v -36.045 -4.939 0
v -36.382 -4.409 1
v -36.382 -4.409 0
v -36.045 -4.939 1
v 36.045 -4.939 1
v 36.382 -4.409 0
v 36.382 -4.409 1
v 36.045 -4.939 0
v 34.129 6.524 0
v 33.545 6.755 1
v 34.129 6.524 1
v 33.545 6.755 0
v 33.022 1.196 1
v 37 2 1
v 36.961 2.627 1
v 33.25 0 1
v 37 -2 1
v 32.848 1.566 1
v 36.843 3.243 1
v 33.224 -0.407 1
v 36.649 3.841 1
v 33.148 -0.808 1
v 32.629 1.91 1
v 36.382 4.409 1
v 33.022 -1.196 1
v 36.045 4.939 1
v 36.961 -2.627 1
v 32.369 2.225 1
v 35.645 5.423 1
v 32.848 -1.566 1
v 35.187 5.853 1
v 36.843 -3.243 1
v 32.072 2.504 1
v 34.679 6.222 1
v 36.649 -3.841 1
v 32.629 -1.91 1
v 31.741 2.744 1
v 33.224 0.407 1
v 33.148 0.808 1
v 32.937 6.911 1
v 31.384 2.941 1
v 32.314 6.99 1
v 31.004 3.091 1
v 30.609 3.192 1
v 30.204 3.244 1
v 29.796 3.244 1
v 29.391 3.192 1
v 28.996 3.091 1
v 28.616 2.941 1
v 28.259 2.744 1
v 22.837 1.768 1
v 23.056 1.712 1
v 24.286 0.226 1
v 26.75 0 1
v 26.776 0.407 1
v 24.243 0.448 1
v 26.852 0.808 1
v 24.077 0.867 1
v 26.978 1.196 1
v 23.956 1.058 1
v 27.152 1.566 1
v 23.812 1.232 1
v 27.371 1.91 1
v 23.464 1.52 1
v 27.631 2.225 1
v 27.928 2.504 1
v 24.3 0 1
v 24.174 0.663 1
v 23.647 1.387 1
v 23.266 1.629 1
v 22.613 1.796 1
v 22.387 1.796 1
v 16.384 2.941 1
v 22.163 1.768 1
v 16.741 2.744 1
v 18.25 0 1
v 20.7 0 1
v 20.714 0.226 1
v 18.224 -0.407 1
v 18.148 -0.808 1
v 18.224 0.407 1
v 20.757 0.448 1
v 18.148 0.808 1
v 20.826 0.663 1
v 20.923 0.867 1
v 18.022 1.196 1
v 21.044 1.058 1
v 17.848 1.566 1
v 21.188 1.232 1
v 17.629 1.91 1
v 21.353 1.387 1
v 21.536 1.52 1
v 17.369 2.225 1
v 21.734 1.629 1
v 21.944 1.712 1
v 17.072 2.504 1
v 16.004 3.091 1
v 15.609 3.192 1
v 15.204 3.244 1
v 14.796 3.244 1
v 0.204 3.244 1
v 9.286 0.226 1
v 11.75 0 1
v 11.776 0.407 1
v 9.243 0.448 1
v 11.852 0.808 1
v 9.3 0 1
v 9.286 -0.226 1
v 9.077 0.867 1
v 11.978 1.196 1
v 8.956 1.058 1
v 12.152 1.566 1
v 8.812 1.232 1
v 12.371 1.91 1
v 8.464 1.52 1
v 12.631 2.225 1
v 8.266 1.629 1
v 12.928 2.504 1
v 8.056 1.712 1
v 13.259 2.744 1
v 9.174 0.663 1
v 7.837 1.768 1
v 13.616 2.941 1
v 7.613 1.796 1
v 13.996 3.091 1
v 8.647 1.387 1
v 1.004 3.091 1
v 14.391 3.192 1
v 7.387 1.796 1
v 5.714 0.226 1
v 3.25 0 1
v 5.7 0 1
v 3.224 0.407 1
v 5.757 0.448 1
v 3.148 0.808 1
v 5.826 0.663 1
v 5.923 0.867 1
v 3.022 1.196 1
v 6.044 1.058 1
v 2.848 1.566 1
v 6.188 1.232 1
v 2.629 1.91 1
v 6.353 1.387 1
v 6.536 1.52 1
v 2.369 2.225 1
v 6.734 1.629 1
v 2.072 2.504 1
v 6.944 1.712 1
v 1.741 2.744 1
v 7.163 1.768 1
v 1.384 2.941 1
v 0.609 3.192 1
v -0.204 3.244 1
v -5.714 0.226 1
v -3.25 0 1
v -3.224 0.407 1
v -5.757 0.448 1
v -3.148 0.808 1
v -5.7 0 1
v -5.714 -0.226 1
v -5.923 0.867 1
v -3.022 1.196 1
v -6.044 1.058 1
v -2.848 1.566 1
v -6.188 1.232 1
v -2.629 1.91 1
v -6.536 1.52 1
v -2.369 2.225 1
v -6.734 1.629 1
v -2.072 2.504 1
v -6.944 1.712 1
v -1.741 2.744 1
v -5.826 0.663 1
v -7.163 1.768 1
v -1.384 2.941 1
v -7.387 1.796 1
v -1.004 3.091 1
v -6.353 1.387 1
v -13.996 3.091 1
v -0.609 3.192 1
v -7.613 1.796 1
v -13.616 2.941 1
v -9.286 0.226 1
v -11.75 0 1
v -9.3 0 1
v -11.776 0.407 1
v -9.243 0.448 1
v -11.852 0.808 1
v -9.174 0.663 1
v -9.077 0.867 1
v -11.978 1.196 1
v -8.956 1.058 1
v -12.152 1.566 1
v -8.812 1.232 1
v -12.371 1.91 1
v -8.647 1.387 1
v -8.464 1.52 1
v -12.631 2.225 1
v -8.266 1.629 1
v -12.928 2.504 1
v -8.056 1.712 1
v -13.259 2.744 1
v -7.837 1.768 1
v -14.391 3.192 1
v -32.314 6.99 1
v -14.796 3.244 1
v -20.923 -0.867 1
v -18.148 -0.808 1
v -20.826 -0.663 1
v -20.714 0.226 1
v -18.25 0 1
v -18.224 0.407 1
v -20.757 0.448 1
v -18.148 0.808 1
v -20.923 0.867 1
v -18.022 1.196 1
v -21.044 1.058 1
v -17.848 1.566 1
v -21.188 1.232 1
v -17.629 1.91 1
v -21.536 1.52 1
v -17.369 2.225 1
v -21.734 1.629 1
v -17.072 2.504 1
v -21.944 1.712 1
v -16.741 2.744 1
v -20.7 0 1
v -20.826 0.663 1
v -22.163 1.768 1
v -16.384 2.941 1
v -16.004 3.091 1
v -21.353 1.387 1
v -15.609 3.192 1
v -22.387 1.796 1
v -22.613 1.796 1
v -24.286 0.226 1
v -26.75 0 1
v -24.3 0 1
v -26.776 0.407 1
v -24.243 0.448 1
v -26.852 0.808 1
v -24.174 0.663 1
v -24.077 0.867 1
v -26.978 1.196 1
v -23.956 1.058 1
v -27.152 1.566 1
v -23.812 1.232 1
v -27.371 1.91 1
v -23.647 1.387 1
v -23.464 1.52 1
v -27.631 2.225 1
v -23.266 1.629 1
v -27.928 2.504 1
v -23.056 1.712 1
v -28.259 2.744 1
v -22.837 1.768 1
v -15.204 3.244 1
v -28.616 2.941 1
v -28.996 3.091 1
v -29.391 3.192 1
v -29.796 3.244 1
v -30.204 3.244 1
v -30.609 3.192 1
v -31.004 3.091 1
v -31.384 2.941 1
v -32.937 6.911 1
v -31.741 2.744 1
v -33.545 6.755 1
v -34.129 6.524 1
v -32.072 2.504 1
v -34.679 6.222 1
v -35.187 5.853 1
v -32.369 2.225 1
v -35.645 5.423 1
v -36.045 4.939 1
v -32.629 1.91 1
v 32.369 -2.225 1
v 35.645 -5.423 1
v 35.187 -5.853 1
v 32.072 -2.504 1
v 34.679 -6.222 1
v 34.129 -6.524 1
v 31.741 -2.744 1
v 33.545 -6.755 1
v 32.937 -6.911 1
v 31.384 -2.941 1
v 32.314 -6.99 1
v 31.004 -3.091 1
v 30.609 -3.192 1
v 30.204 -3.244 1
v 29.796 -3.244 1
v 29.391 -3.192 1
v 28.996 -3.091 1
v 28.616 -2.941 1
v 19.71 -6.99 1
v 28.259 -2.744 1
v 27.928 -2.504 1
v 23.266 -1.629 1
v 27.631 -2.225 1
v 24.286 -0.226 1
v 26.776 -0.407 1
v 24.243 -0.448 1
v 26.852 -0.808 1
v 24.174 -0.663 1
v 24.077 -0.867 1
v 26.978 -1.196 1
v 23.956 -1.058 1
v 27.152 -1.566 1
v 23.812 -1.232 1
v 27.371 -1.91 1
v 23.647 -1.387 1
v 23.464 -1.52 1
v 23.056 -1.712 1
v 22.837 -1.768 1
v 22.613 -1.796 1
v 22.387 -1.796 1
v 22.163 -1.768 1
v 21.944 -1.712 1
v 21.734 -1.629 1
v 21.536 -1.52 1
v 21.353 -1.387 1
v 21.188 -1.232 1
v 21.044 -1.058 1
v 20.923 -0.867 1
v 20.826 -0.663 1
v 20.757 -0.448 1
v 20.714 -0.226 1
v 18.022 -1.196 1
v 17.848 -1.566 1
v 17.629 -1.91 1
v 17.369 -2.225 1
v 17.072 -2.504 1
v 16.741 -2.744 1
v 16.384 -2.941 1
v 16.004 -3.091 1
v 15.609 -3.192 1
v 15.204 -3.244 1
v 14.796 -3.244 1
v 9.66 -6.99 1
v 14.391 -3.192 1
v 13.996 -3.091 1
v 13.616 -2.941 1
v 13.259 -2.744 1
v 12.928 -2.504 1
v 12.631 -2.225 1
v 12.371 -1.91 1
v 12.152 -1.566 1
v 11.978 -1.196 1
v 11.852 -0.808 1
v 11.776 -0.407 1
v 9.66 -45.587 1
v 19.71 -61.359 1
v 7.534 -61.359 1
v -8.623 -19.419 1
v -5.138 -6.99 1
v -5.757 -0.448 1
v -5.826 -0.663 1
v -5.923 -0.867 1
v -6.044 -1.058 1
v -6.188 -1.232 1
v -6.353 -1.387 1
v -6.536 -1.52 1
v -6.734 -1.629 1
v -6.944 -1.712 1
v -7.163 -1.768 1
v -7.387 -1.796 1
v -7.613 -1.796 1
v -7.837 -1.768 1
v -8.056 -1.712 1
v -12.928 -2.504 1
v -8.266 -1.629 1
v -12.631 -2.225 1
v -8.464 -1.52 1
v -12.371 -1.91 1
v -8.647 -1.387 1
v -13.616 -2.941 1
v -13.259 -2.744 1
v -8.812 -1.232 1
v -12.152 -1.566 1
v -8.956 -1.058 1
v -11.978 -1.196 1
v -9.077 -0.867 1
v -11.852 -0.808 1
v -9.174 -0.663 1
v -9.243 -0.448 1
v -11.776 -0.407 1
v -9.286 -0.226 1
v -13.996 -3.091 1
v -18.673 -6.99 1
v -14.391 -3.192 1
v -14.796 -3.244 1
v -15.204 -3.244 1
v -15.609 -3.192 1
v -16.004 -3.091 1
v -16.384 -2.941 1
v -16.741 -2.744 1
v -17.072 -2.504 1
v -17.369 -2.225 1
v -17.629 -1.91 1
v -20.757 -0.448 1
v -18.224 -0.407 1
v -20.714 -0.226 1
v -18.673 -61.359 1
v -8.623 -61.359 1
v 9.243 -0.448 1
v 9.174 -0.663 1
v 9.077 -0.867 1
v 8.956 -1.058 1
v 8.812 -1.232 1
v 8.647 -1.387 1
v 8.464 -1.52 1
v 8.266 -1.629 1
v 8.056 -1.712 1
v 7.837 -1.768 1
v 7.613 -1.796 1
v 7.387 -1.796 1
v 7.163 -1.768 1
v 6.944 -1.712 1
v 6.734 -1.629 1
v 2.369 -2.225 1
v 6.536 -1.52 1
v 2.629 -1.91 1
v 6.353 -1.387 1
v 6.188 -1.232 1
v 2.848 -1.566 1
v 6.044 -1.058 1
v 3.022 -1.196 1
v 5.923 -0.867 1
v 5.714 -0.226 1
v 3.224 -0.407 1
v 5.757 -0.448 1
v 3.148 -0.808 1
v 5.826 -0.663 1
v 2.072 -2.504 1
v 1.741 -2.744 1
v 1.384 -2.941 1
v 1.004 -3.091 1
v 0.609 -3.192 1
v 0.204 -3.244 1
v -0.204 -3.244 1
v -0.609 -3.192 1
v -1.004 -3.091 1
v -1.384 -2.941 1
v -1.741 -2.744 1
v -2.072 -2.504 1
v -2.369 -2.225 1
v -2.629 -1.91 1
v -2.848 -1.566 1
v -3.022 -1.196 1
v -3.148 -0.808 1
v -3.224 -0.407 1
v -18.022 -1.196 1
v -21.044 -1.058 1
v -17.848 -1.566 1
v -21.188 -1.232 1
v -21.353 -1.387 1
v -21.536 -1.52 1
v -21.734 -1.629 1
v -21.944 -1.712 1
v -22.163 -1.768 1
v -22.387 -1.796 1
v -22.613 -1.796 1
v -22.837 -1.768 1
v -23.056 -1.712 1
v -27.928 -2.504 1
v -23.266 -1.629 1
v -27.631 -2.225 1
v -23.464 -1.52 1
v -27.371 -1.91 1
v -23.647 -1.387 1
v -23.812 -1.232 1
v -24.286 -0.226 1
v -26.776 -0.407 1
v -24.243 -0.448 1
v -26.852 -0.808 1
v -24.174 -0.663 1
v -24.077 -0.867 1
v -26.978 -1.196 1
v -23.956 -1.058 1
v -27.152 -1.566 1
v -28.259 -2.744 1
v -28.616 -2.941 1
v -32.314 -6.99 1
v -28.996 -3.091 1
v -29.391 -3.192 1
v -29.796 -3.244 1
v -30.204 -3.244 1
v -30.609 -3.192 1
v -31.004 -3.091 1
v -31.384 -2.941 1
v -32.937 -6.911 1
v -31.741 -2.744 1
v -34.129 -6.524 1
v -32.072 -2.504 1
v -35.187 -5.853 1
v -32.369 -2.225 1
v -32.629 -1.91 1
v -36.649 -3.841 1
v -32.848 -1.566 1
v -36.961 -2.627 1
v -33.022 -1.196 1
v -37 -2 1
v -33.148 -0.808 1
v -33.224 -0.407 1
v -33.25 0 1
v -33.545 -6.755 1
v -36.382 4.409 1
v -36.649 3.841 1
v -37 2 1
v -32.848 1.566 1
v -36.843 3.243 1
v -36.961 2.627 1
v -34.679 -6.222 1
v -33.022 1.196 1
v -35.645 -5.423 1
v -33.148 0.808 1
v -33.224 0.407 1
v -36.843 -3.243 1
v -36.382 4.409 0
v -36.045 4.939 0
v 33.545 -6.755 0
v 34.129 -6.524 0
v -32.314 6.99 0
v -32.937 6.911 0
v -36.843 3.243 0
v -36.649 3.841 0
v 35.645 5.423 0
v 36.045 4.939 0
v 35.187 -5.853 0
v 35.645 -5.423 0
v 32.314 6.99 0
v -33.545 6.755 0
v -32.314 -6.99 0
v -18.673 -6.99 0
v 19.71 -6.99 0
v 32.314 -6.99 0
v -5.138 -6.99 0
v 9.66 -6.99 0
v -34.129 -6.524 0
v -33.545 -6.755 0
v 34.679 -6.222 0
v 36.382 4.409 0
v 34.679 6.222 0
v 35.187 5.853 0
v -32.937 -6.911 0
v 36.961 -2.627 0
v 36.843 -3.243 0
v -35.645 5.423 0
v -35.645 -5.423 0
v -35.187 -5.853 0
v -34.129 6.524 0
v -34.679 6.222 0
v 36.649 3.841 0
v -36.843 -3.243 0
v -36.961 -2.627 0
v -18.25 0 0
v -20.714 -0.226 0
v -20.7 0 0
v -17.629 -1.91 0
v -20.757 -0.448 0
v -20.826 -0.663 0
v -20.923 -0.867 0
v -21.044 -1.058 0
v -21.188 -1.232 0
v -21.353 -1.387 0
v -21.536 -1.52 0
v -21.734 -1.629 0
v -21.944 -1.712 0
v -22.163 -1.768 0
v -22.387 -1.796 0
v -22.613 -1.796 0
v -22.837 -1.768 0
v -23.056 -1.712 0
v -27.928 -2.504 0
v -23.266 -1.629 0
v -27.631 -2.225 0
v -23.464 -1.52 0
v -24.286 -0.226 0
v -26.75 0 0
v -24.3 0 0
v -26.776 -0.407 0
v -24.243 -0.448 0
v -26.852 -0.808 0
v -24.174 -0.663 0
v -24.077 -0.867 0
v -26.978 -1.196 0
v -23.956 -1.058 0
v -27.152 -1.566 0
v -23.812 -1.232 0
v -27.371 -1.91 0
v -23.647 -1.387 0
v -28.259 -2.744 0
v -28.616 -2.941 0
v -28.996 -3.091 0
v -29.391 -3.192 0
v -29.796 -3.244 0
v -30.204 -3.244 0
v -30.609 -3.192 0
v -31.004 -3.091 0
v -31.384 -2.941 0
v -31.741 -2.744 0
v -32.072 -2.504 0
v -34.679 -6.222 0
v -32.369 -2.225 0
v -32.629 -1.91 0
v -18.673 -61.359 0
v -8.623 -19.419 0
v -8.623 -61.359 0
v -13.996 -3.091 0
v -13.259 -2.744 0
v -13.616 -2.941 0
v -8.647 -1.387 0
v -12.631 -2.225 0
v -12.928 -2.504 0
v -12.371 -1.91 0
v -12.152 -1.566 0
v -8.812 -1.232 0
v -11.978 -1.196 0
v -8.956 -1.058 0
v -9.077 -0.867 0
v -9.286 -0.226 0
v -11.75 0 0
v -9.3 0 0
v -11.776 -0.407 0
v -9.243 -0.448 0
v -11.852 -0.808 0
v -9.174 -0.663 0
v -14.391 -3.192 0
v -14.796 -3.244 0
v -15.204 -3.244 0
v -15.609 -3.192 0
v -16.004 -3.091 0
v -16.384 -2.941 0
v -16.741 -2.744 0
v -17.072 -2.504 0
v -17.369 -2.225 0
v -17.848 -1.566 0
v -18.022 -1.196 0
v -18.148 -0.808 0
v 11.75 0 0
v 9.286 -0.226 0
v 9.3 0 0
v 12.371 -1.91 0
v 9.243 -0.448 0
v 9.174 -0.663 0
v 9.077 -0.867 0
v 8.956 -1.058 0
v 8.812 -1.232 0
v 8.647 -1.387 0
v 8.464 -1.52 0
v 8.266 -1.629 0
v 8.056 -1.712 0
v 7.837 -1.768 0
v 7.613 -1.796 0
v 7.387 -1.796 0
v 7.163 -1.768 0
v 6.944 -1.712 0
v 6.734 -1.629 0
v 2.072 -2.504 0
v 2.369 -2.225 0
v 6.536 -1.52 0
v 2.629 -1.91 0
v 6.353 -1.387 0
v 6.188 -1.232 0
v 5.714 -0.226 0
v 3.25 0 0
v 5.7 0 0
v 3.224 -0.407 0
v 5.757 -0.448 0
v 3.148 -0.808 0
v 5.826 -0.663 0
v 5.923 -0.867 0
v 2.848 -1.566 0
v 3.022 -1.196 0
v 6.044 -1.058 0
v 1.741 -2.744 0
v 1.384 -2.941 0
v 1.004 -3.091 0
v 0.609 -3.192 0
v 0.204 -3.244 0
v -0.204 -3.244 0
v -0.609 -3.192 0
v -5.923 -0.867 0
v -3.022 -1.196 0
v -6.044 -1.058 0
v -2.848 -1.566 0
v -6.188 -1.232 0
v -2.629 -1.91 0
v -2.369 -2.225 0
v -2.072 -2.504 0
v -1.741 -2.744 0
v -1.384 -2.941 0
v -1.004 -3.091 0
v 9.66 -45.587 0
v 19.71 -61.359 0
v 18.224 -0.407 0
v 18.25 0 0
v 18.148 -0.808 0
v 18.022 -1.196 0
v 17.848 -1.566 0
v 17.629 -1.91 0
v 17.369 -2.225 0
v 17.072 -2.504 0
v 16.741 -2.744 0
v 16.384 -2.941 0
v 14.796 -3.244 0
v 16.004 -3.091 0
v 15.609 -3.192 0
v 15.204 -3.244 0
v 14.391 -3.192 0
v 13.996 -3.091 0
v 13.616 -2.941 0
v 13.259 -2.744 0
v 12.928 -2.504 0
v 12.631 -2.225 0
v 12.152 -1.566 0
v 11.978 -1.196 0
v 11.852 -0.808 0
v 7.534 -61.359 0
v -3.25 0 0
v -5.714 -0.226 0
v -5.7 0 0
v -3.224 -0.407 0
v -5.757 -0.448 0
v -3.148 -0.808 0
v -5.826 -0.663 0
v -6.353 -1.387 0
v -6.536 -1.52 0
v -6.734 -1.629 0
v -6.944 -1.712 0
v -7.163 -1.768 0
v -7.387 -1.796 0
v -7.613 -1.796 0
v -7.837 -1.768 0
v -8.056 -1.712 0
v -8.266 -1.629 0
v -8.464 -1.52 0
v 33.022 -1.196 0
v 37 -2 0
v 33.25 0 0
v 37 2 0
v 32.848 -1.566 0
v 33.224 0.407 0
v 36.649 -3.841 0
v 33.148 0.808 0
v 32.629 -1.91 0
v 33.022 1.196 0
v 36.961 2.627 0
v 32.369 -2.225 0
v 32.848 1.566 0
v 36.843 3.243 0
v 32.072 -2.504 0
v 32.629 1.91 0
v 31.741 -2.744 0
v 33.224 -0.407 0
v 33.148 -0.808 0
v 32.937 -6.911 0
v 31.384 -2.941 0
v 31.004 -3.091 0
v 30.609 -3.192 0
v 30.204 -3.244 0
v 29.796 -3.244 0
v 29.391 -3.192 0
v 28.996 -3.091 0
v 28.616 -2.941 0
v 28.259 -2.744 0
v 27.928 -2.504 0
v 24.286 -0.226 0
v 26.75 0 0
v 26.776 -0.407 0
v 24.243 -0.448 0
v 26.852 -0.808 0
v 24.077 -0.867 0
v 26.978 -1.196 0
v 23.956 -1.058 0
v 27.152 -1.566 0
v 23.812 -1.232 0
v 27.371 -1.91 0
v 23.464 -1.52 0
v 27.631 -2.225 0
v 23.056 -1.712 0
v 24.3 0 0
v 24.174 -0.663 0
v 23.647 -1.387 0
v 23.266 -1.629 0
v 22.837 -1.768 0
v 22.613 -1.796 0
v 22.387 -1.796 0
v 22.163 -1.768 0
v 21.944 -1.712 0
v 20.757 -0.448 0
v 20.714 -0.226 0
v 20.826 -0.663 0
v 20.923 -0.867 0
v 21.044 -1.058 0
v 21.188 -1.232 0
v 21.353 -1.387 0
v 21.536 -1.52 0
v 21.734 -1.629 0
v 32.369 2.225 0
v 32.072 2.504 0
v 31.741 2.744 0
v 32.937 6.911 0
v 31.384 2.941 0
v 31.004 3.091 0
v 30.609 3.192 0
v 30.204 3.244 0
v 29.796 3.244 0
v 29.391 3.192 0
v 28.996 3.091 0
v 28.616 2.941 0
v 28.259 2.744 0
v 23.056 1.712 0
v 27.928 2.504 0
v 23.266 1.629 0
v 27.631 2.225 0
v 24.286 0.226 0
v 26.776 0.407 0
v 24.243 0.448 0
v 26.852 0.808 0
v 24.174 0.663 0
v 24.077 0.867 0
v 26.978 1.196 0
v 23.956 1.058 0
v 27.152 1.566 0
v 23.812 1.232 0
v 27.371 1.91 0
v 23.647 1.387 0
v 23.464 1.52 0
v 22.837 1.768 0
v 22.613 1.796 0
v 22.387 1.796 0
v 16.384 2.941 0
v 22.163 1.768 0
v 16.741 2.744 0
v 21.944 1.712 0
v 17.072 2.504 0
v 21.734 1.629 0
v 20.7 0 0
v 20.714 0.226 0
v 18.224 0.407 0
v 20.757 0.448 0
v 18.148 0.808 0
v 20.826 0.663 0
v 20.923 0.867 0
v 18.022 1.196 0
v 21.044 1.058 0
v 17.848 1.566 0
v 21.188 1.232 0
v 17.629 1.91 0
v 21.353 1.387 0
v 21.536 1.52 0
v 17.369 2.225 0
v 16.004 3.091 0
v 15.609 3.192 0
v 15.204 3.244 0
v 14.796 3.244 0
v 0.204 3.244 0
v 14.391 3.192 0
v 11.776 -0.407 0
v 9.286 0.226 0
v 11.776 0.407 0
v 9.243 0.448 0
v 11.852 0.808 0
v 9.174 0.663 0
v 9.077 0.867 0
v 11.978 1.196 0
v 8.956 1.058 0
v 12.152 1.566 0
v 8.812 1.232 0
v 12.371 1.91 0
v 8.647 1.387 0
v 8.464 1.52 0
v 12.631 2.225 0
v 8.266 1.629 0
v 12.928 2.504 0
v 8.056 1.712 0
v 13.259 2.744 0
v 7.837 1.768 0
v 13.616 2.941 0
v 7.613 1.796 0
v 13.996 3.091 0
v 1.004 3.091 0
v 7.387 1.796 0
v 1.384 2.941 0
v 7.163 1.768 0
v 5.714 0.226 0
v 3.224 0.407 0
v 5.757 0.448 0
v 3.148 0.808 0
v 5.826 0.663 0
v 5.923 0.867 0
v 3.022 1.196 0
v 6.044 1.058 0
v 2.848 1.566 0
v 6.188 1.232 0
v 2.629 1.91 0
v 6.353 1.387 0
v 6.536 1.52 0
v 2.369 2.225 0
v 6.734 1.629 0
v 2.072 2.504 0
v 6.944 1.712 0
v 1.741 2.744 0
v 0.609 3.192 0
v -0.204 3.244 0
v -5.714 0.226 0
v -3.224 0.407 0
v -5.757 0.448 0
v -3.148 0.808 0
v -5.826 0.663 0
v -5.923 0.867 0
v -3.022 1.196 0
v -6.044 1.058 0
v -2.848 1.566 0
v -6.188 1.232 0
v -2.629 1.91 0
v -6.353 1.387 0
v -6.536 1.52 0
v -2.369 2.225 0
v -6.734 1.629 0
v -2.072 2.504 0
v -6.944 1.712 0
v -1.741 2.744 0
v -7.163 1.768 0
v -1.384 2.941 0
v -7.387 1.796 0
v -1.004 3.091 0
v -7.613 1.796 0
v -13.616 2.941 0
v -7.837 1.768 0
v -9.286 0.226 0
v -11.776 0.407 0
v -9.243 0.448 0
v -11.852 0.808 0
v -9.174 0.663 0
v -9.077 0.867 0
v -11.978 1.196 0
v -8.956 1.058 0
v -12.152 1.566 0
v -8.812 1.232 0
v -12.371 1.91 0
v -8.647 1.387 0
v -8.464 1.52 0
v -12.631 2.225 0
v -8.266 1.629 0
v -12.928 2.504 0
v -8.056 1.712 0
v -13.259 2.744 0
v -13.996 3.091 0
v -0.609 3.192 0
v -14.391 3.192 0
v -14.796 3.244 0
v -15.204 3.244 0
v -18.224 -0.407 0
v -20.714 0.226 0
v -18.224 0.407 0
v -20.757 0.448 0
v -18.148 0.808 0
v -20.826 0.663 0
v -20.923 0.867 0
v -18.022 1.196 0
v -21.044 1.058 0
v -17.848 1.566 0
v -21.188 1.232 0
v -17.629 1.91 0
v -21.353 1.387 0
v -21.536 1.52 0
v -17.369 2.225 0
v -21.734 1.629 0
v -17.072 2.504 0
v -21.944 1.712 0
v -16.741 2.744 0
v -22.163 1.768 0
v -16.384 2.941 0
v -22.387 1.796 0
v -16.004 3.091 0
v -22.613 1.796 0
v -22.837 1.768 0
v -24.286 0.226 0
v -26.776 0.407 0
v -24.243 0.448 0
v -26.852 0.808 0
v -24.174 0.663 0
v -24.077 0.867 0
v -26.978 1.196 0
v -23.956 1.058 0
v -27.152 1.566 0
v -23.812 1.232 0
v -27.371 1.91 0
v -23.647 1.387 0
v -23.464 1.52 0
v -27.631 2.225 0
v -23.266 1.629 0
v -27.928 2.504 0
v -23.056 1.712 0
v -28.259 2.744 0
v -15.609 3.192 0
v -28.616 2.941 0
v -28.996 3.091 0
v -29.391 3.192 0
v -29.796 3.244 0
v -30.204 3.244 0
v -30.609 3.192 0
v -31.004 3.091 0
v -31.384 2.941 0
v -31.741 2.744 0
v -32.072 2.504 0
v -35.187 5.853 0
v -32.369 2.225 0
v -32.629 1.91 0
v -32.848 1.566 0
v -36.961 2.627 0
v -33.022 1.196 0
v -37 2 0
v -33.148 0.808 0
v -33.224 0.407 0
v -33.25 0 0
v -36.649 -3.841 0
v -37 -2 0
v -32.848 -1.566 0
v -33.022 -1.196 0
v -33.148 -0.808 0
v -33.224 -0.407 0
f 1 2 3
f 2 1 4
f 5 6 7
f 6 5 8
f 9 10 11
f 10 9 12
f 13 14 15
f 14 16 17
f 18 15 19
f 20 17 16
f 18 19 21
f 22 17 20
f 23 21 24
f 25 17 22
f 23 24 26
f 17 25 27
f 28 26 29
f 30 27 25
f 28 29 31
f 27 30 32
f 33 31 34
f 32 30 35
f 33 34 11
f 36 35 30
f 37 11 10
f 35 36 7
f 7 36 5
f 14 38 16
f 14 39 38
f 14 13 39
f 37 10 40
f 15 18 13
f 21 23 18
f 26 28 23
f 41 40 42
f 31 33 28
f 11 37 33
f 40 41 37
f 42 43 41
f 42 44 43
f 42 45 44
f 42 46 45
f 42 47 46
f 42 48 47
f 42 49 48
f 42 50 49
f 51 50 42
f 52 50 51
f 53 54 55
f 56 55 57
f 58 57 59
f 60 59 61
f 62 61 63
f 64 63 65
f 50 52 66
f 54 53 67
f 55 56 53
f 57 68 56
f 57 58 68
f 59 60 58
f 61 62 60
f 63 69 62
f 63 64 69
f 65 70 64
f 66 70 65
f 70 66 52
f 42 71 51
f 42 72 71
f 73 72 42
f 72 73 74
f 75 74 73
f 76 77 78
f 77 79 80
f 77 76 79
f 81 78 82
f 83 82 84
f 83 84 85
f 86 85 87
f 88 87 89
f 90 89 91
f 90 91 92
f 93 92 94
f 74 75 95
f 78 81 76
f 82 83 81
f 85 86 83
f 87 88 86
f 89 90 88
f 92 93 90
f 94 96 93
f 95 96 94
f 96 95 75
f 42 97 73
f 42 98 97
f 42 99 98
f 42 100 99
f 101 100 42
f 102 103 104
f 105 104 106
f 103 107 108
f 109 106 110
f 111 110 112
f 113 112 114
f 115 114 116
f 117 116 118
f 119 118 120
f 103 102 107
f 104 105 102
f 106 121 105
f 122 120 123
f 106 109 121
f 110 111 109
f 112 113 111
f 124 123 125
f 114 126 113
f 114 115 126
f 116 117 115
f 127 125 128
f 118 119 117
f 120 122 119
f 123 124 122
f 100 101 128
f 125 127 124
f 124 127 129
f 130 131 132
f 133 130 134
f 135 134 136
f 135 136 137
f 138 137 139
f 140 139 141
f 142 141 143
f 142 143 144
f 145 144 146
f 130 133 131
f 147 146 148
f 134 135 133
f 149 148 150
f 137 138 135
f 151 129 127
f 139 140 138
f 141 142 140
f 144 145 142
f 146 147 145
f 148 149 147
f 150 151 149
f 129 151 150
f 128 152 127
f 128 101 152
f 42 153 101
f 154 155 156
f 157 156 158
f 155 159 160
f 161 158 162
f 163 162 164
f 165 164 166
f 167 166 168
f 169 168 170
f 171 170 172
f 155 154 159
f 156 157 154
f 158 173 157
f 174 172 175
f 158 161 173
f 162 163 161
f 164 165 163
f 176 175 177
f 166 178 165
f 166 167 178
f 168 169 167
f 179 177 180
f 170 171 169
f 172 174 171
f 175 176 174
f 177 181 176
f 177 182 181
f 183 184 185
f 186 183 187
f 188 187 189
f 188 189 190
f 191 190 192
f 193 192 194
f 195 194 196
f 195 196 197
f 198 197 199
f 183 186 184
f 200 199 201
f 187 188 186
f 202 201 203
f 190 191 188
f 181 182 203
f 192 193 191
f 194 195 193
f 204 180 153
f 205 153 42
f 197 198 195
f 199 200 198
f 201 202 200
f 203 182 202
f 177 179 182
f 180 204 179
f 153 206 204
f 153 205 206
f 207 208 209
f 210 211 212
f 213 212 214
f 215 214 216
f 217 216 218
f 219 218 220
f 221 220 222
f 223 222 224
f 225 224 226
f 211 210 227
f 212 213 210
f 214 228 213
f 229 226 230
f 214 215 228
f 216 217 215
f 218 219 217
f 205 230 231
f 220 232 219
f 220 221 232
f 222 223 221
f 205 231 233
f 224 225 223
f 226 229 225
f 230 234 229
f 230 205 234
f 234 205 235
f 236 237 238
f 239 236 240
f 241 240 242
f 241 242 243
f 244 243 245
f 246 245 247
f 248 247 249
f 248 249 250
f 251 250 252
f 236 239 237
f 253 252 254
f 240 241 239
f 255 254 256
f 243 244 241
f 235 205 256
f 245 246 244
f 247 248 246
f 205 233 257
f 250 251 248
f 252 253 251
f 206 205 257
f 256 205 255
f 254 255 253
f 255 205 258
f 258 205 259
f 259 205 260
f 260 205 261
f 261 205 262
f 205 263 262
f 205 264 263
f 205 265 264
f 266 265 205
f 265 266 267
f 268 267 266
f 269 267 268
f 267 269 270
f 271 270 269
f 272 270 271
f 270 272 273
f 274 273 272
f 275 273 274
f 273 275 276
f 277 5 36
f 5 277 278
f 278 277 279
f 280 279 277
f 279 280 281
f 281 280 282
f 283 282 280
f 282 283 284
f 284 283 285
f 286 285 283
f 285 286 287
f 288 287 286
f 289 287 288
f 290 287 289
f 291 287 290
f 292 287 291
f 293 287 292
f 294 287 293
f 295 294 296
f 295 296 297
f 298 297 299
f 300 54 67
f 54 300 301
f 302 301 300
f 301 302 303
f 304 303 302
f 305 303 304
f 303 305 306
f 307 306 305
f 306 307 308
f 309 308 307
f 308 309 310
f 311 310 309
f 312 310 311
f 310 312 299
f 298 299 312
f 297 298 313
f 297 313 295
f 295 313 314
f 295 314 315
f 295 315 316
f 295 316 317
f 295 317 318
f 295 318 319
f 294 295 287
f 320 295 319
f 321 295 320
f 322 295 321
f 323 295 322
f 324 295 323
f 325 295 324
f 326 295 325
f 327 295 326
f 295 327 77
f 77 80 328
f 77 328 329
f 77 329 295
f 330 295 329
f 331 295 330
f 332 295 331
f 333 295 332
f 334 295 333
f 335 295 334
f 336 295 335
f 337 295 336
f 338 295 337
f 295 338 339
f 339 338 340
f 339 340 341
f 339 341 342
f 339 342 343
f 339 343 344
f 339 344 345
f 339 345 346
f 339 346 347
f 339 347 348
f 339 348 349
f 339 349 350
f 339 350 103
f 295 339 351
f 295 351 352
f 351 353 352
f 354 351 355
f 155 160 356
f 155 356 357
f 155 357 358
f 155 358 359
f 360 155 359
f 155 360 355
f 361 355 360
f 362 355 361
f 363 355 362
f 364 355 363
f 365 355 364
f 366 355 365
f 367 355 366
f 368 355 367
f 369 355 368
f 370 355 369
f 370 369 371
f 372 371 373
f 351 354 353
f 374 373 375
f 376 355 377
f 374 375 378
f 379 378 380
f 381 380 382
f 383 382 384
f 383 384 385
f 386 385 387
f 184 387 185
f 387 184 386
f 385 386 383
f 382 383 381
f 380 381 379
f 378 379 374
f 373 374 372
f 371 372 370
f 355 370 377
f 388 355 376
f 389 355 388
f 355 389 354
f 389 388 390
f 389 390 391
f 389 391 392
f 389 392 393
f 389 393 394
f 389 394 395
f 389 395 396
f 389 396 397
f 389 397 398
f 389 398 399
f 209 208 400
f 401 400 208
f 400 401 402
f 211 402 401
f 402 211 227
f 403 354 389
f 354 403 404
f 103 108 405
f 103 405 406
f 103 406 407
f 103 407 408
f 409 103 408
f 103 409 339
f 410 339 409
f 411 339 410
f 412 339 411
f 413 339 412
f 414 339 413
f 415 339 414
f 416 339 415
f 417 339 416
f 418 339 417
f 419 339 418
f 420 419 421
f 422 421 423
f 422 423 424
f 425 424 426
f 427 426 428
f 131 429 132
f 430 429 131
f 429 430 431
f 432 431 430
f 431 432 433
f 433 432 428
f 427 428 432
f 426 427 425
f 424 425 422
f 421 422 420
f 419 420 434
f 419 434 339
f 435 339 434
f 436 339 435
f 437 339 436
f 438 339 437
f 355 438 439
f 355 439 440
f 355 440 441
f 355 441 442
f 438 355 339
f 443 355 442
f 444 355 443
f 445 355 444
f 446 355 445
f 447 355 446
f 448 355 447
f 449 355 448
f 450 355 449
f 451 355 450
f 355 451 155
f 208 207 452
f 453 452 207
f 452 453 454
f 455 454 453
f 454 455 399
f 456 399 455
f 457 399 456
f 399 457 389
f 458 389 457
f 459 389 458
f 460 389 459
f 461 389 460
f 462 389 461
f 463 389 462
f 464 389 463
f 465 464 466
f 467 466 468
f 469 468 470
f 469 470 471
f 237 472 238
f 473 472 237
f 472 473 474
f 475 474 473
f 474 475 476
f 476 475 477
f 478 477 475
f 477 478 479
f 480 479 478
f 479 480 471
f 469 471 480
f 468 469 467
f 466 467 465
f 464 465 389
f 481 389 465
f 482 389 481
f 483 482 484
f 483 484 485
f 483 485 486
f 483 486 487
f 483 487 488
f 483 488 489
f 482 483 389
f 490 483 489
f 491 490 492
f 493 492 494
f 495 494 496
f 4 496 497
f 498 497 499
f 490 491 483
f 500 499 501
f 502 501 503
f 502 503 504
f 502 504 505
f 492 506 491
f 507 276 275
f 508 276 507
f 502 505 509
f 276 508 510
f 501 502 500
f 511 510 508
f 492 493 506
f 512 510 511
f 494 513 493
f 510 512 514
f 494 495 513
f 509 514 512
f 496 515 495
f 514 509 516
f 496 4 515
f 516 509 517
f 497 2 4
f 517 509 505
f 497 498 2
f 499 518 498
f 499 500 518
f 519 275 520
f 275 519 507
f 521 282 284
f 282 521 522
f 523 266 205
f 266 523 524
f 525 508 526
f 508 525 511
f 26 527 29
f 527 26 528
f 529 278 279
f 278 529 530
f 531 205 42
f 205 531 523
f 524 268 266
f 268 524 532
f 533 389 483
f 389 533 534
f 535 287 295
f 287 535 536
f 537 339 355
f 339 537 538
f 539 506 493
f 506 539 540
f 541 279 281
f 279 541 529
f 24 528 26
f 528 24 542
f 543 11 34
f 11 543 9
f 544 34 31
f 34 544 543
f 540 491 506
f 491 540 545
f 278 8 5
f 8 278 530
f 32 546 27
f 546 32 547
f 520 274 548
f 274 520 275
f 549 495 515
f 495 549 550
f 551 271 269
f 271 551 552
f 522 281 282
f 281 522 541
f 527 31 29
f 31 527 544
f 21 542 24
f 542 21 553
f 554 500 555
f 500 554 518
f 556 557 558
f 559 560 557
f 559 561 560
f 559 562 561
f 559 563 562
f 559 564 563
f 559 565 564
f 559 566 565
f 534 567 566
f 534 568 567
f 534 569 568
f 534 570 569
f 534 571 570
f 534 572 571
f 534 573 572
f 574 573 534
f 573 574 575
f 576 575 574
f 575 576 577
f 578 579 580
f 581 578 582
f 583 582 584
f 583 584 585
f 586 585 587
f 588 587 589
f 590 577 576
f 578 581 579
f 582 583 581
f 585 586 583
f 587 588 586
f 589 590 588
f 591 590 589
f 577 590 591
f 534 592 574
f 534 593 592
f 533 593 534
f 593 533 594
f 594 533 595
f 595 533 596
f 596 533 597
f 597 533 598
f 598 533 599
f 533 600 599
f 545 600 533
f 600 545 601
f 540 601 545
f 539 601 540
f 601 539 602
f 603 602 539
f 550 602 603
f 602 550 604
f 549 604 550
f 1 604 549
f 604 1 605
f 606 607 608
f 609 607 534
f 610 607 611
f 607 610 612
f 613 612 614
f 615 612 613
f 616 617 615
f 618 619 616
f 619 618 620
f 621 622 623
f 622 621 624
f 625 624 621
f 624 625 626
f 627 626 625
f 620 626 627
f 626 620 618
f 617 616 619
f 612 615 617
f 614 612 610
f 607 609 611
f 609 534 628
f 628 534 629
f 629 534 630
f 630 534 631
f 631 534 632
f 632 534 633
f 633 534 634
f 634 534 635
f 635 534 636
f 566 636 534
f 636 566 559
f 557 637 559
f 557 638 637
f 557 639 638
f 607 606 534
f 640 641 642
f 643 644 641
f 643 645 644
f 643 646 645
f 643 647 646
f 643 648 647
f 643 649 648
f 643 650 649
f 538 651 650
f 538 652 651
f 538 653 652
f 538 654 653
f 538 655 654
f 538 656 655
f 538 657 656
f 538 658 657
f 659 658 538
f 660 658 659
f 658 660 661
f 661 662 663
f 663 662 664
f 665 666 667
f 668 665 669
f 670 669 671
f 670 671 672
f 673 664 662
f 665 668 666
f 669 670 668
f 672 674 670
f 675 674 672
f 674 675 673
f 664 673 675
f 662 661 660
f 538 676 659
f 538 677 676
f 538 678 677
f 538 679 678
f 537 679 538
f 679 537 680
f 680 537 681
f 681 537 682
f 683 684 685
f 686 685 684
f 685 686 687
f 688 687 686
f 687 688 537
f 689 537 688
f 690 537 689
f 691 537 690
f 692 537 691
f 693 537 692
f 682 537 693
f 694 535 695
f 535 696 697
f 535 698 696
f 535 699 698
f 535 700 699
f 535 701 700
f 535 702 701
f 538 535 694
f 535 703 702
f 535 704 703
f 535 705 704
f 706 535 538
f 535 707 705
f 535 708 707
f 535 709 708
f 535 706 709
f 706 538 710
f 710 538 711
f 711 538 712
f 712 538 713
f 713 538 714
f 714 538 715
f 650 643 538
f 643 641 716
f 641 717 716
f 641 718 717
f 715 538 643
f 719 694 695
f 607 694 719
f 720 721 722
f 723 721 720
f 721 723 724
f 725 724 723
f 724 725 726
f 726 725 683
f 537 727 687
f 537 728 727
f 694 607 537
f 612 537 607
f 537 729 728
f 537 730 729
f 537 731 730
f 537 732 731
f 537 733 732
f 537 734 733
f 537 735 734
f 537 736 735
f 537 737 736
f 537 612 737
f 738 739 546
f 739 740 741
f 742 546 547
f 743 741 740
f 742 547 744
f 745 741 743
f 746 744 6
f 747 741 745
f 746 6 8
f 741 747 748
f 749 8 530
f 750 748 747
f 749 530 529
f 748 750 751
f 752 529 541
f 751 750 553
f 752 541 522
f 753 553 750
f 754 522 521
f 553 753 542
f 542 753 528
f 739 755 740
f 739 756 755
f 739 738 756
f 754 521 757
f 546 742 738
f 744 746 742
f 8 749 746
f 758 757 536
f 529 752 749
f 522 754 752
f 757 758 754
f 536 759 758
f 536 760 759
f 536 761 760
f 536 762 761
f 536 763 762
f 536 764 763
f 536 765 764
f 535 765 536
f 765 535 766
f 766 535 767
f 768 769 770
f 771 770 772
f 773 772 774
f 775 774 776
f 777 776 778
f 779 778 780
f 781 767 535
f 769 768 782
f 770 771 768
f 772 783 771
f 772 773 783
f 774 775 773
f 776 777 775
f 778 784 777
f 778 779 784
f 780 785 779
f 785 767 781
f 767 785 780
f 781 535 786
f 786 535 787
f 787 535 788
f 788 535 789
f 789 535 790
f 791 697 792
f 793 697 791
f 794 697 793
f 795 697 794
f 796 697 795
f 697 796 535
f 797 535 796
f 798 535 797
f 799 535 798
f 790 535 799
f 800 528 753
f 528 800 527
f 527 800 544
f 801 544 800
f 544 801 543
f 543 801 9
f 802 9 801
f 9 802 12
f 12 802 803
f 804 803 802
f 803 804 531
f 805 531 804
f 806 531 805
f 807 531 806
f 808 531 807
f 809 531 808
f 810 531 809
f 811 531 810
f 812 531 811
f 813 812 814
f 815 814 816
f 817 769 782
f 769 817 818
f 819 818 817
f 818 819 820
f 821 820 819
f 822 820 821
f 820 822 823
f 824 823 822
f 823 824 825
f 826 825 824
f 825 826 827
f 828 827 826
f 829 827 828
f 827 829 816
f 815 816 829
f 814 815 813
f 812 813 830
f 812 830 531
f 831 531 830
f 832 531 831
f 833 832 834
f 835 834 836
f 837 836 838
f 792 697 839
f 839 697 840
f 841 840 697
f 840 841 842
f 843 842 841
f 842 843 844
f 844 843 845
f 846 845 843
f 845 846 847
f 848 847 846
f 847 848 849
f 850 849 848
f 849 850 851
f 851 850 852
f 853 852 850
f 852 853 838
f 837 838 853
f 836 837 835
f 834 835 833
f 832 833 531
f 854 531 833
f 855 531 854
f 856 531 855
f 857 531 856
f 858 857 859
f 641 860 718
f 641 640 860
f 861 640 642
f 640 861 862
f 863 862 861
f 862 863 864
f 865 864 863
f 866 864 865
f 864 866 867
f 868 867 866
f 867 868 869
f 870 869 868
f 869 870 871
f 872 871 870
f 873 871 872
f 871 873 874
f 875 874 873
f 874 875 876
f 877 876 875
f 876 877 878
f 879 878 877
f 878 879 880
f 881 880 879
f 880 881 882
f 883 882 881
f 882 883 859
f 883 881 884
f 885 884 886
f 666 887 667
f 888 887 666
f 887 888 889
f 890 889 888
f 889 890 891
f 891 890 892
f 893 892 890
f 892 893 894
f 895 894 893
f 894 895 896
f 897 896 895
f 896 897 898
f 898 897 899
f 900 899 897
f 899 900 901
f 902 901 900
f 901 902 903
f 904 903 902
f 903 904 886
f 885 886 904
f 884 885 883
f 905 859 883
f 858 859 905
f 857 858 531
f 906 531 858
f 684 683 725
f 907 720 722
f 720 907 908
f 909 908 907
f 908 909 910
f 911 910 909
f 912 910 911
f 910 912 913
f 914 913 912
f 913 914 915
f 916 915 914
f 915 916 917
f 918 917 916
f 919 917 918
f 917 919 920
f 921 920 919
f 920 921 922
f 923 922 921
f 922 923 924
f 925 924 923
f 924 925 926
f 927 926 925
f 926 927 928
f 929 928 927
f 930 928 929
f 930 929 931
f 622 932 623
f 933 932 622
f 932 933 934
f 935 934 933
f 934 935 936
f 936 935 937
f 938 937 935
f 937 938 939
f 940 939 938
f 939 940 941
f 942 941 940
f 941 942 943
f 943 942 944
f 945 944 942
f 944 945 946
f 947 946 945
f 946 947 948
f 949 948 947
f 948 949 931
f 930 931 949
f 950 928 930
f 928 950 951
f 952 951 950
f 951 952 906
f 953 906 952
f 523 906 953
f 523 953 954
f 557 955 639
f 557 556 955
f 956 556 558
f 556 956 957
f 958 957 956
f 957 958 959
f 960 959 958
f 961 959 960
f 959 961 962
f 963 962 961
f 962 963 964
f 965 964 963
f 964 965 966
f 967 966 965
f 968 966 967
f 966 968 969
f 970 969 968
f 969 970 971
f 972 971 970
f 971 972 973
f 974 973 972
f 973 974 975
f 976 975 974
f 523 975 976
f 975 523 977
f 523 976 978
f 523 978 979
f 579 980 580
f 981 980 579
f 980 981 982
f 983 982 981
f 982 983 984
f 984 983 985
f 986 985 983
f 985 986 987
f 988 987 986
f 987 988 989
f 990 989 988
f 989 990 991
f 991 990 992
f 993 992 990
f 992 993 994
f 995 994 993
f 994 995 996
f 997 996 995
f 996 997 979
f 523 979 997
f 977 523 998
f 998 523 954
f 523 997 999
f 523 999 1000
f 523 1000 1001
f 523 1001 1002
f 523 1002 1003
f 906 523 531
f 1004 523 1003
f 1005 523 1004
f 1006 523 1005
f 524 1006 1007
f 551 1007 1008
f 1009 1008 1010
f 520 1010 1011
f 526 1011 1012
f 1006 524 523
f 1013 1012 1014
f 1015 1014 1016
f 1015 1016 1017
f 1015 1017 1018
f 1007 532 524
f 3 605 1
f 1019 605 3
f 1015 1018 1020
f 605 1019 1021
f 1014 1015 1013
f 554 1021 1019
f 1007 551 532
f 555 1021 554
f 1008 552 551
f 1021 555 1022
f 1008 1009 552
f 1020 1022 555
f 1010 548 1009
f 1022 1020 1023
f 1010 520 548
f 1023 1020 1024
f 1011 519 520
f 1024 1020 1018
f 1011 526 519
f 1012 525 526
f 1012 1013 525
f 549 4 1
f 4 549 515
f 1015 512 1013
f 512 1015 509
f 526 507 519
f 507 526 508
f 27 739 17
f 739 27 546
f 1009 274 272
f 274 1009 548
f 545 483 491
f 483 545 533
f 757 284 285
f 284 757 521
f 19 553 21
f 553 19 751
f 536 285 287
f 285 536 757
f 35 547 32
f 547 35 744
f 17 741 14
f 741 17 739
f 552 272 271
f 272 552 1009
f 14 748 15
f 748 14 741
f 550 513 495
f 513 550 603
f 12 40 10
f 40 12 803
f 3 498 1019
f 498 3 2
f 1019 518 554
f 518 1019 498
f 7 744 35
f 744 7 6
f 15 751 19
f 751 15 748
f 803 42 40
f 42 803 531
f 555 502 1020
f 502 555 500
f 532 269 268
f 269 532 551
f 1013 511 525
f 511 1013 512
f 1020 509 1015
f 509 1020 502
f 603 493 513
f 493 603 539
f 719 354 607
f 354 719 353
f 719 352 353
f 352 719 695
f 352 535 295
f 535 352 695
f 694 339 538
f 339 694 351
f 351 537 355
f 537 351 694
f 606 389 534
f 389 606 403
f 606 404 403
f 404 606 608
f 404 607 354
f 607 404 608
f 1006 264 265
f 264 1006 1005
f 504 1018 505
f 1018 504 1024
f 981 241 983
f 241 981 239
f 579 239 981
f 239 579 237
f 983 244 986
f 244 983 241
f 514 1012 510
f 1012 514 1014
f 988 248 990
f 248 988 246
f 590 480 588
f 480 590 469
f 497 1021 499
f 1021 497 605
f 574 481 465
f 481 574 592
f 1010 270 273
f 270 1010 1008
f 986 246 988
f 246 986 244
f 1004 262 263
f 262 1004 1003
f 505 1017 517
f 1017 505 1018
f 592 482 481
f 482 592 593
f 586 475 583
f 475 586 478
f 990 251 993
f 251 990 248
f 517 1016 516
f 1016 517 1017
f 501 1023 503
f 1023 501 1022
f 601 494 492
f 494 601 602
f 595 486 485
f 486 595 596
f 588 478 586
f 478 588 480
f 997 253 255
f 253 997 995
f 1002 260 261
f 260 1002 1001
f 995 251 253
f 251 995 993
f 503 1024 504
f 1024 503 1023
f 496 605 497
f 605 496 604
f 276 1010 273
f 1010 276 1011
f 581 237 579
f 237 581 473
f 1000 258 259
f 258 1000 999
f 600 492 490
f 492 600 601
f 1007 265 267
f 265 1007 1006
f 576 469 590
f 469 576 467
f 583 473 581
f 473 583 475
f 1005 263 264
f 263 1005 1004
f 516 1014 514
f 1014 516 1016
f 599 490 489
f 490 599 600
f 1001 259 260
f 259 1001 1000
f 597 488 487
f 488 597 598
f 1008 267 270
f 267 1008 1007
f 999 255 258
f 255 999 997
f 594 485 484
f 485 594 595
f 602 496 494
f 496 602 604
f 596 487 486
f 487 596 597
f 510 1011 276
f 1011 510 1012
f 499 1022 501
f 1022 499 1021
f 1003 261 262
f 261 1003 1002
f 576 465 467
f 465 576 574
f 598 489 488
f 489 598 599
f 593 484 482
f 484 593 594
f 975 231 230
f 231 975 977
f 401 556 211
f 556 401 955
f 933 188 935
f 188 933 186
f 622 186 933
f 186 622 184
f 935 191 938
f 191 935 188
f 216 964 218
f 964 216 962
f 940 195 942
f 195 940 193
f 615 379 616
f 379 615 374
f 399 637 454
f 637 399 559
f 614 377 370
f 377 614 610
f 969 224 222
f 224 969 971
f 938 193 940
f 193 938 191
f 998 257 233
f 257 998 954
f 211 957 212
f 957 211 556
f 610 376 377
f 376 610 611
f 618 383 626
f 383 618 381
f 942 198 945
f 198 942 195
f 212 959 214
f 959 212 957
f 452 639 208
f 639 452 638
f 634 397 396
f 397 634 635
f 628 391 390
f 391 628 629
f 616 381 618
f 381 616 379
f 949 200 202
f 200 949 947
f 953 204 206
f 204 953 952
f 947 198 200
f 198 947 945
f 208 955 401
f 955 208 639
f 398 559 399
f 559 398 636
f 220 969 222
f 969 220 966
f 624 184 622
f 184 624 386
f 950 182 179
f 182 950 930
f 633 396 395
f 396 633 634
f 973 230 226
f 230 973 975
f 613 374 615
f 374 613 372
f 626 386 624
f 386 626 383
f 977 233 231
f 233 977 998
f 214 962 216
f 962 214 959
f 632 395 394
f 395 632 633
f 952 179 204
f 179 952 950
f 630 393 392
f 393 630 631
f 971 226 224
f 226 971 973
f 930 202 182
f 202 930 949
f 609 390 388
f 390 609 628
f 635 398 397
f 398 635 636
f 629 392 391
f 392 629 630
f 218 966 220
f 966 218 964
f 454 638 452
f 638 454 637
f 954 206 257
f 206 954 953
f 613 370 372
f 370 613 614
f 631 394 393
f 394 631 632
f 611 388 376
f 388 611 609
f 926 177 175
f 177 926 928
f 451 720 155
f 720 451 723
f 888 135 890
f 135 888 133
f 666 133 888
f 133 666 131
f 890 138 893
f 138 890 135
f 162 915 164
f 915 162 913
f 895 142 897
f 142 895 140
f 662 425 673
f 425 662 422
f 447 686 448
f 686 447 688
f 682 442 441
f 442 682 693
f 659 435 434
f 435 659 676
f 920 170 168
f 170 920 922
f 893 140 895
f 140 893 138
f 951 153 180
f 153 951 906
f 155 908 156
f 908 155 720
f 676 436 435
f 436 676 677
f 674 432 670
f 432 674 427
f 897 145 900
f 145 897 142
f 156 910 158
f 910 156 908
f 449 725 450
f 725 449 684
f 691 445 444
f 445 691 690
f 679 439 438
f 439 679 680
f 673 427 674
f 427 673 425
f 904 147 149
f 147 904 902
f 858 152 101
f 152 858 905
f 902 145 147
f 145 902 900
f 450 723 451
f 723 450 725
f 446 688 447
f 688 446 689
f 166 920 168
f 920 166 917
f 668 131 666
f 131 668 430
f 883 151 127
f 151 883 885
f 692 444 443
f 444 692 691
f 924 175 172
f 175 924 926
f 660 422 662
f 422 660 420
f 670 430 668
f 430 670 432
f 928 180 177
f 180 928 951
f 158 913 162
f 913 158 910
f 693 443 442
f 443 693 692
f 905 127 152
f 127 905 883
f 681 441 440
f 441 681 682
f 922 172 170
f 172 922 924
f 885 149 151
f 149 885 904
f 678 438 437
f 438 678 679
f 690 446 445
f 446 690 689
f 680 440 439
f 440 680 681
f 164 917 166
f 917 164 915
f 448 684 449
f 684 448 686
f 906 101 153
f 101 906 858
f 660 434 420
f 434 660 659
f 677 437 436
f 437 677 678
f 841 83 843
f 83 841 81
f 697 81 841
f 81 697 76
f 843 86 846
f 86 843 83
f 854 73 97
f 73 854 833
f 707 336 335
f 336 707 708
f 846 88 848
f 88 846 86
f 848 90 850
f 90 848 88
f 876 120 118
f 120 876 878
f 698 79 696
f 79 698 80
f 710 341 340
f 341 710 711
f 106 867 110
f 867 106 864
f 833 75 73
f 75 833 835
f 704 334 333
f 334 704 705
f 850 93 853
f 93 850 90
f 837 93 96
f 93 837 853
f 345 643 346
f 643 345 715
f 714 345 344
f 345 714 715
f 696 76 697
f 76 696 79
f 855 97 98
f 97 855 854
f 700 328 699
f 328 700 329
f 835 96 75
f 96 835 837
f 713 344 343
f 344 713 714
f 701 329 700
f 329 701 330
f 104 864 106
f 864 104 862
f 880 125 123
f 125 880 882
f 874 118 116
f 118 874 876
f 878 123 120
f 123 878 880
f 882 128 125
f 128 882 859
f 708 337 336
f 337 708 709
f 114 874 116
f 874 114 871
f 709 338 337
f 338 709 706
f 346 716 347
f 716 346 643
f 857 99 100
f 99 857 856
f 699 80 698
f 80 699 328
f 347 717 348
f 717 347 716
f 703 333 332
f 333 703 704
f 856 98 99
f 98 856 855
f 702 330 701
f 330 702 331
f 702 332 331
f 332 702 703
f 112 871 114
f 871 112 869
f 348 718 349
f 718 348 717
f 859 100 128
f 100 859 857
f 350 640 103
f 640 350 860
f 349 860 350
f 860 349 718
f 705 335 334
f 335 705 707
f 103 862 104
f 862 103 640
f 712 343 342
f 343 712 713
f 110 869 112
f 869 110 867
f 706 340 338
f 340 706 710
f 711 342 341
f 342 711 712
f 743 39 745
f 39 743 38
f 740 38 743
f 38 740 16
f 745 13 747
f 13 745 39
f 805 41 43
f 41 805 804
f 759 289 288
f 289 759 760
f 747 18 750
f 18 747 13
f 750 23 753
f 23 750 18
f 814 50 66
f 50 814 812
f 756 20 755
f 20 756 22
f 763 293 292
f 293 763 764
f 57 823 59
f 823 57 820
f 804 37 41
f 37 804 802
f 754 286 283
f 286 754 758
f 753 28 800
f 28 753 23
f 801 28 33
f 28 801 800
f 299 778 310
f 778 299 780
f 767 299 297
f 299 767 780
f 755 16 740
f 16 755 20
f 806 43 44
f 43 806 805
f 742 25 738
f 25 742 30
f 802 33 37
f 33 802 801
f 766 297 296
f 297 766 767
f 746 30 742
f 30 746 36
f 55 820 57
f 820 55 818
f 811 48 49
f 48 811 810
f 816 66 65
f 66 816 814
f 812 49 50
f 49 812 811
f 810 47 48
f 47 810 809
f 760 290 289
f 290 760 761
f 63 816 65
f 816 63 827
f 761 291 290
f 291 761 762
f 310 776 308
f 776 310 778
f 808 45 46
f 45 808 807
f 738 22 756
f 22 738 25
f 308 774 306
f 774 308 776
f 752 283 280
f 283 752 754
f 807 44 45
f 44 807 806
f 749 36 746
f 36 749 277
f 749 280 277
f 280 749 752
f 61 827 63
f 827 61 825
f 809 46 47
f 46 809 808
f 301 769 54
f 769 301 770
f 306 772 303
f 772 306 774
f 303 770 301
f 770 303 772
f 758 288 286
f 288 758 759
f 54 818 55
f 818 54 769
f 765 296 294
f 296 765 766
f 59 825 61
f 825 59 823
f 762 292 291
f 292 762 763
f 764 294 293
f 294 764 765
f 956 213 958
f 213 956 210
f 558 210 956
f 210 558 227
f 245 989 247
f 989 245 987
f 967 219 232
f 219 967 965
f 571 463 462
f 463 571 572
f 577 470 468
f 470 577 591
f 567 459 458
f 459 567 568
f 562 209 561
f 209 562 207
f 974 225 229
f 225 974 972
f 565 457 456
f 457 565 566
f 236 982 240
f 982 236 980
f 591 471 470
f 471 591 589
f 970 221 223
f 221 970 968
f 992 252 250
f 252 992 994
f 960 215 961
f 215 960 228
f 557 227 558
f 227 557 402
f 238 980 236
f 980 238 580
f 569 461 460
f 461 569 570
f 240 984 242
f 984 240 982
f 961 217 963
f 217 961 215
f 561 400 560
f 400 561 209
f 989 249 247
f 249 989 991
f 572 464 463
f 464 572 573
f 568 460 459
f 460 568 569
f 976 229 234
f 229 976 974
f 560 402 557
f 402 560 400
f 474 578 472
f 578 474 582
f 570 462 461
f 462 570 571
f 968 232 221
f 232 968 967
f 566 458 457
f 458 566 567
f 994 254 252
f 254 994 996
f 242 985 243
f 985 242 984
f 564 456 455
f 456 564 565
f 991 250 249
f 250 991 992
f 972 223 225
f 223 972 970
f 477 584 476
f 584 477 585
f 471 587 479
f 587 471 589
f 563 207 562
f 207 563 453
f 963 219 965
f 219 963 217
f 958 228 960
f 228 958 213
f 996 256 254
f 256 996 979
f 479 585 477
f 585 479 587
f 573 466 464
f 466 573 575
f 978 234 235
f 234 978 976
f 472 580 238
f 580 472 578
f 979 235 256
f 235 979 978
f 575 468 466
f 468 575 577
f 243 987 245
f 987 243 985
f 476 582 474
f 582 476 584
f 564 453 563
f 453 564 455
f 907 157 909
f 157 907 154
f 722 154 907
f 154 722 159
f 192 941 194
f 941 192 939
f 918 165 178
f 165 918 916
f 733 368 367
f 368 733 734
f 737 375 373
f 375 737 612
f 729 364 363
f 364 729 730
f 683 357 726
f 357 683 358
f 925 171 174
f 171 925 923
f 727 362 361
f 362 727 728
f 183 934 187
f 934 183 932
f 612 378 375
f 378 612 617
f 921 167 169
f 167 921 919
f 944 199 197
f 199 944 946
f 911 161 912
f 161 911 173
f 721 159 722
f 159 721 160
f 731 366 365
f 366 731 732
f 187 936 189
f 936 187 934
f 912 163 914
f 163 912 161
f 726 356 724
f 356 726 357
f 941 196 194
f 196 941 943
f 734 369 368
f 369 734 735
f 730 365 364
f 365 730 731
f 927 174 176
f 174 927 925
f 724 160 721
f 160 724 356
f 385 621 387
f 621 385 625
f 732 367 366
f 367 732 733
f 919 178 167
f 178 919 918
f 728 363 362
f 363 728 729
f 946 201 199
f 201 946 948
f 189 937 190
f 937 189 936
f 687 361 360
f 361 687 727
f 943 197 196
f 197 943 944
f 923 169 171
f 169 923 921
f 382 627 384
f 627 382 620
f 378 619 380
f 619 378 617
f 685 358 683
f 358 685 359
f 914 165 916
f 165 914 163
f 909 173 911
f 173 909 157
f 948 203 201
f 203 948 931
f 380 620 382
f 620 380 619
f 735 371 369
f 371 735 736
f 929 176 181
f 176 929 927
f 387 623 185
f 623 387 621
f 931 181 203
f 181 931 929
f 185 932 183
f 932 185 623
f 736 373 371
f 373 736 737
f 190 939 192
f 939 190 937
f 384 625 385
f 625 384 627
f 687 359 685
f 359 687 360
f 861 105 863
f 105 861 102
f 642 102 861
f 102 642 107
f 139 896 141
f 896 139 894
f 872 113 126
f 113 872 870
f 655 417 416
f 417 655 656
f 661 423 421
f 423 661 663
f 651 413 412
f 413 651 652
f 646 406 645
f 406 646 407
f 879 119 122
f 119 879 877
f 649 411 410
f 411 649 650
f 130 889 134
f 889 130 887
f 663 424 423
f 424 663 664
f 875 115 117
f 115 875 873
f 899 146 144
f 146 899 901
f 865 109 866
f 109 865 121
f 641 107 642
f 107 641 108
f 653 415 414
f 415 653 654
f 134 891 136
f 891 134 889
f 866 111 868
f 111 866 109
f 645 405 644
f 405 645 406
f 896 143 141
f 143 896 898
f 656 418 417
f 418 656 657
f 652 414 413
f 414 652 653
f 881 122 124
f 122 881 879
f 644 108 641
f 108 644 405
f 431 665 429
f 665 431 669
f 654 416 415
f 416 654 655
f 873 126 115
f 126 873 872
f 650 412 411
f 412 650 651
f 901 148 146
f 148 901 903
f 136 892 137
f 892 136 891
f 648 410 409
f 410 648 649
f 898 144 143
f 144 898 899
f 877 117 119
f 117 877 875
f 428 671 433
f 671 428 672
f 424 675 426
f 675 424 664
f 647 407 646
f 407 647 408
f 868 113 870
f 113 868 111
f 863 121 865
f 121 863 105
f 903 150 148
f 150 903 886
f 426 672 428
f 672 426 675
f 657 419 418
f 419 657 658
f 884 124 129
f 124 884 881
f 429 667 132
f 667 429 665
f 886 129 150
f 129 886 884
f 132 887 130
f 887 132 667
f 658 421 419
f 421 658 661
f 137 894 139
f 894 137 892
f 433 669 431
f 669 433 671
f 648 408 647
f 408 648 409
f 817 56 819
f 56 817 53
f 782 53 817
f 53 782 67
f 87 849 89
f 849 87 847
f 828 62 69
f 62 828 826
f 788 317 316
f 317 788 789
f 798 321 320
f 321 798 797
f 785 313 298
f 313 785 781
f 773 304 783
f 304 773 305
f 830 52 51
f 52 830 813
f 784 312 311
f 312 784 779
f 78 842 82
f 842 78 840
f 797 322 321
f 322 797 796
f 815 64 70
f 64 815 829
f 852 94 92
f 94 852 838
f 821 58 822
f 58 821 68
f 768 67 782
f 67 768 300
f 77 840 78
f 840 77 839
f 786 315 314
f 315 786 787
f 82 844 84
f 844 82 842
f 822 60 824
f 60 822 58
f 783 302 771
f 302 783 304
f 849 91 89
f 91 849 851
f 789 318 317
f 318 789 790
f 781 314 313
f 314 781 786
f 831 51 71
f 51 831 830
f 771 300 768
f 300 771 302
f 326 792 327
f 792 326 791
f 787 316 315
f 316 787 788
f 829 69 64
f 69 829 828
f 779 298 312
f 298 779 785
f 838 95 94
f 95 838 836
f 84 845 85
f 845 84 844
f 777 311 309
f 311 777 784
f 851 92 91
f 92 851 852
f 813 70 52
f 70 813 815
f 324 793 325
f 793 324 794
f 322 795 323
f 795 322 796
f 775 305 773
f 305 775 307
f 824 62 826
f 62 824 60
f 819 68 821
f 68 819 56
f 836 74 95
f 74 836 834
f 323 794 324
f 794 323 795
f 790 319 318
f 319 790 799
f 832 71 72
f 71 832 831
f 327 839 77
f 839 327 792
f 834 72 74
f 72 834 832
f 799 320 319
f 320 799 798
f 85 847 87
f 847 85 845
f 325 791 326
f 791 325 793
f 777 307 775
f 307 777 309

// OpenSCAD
$fn = 50;


difference() {
	union() {
		*color(alpha = 1.0000000000, c = "gray") {
			translate(v = [0, 14, 0]) {
				linear_extrude(height = 1) {
					text(font = "Arial:style=Bold", halign = "center", size = 4.5000000000, text = "COMMENT description oobb_plate_shape_p_type_1_depth_5_width_1_thickness_n_extra_oobb_size", valign = "center");
				}
			}
		}
		hull() {
			translate(v = [-32.0000000000, 2.0000000000, 0]) {
				cylinder(h = 1, r = 5);
			}
			translate(v = [32.0000000000, 2.0000000000, 0]) {
				cylinder(h = 1, r = 5);
			}
			translate(v = [-32.0000000000, -2.0000000000, 0]) {
				cylinder(h = 1, r = 5);
			}
			translate(v = [32.0000000000, -2.0000000000, 0]) {
				cylinder(h = 1, r = 5);
			}
		}
		translate(v = [0, -5, 0]) {
			linear_extrude(height = 1) {
				text(font = "DejaVu Sans Mono:style=Bold", halign = "center", size = 57.0000000000, text = "N", valign = "top");
			}
		}
	}
	union() {
		*color(alpha = 1.0000000000, c = "gray") {
			translate(v = [0, 14, 0]) {
				linear_extrude(height = 1) {
					text(font = "Arial:style=Bold", halign = "center", size = 4.5000000000, text = "COMMENT description oobb_holes_shape_n_type_5_width_1_thickness_n_extra_oobb_size_1_height_'all'_holes_true_both_holes", valign = "center");
				}
			}
		}
		translate(v = [-30.0000000000, 0.0000000000, 0]) {
			translate(v = [0, 0, -50]) {
				cylinder(h = 100, r = 3.2500000000);
			}
		}
		translate(v = [-15.0000000000, 0.0000000000, 0]) {
			translate(v = [0, 0, -50]) {
				cylinder(h = 100, r = 3.2500000000);
			}
		}
		translate(v = [0, 0, -50]) {
			cylinder(h = 100, r = 3.2500000000);
		}
		translate(v = [15.0000000000, 0.0000000000, 0]) {
			translate(v = [0, 0, -50]) {
				cylinder(h = 100, r = 3.2500000000);
			}
		}
		translate(v = [30.0000000000, 0.0000000000, 0]) {
			translate(v = [0, 0, -50]) {
				cylinder(h = 100, r = 3.2500000000);
			}
		}
		translate(v = [-30.0000000000, 0.0000000000, 0]) {
			translate(v = [0, 0, -50]) {
				cylinder(h = 100, r = 1.8000000000);
			}
		}
		translate(v = [-22.5000000000, 0.0000000000, 0]) {
			translate(v = [0, 0, -50]) {
				cylinder(h = 100, r = 1.8000000000);
			}
		}
		translate(v = [-15.0000000000, 0.0000000000, 0]) {
			translate(v = [0, 0, -50]) {
				cylinder(h = 100, r = 1.8000000000);
			}
		}
		translate(v = [-7.5000000000, 0.0000000000, 0]) {
			translate(v = [0, 0, -50]) {
				cylinder(h = 100, r = 1.8000000000);
			}
		}
		translate(v = [0, 0, -50]) {
			cylinder(h = 100, r = 1.8000000000);
		}
		translate(v = [7.5000000000, 0.0000000000, 0]) {
			translate(v = [0, 0, -50]) {
				cylinder(h = 100, r = 1.8000000000);
			}
		}
		translate(v = [15.0000000000, 0.0000000000, 0]) {
			translate(v = [0, 0, -50]) {
				cylinder(h = 100, r = 1.8000000000);
			}
		}
		translate(v = [22.5000000000, 0.0000000000, 0]) {
			translate(v = [0, 0, -50]) {
				cylinder(h = 100, r = 1.8000000000);
			}
		}
		translate(v = [30.0000000000, 0.0000000000, 0]) {
			translate(v = [0, 0, -50]) {
				cylinder(h = 100, r = 1.8000000000);
			}
		}
	}
}
